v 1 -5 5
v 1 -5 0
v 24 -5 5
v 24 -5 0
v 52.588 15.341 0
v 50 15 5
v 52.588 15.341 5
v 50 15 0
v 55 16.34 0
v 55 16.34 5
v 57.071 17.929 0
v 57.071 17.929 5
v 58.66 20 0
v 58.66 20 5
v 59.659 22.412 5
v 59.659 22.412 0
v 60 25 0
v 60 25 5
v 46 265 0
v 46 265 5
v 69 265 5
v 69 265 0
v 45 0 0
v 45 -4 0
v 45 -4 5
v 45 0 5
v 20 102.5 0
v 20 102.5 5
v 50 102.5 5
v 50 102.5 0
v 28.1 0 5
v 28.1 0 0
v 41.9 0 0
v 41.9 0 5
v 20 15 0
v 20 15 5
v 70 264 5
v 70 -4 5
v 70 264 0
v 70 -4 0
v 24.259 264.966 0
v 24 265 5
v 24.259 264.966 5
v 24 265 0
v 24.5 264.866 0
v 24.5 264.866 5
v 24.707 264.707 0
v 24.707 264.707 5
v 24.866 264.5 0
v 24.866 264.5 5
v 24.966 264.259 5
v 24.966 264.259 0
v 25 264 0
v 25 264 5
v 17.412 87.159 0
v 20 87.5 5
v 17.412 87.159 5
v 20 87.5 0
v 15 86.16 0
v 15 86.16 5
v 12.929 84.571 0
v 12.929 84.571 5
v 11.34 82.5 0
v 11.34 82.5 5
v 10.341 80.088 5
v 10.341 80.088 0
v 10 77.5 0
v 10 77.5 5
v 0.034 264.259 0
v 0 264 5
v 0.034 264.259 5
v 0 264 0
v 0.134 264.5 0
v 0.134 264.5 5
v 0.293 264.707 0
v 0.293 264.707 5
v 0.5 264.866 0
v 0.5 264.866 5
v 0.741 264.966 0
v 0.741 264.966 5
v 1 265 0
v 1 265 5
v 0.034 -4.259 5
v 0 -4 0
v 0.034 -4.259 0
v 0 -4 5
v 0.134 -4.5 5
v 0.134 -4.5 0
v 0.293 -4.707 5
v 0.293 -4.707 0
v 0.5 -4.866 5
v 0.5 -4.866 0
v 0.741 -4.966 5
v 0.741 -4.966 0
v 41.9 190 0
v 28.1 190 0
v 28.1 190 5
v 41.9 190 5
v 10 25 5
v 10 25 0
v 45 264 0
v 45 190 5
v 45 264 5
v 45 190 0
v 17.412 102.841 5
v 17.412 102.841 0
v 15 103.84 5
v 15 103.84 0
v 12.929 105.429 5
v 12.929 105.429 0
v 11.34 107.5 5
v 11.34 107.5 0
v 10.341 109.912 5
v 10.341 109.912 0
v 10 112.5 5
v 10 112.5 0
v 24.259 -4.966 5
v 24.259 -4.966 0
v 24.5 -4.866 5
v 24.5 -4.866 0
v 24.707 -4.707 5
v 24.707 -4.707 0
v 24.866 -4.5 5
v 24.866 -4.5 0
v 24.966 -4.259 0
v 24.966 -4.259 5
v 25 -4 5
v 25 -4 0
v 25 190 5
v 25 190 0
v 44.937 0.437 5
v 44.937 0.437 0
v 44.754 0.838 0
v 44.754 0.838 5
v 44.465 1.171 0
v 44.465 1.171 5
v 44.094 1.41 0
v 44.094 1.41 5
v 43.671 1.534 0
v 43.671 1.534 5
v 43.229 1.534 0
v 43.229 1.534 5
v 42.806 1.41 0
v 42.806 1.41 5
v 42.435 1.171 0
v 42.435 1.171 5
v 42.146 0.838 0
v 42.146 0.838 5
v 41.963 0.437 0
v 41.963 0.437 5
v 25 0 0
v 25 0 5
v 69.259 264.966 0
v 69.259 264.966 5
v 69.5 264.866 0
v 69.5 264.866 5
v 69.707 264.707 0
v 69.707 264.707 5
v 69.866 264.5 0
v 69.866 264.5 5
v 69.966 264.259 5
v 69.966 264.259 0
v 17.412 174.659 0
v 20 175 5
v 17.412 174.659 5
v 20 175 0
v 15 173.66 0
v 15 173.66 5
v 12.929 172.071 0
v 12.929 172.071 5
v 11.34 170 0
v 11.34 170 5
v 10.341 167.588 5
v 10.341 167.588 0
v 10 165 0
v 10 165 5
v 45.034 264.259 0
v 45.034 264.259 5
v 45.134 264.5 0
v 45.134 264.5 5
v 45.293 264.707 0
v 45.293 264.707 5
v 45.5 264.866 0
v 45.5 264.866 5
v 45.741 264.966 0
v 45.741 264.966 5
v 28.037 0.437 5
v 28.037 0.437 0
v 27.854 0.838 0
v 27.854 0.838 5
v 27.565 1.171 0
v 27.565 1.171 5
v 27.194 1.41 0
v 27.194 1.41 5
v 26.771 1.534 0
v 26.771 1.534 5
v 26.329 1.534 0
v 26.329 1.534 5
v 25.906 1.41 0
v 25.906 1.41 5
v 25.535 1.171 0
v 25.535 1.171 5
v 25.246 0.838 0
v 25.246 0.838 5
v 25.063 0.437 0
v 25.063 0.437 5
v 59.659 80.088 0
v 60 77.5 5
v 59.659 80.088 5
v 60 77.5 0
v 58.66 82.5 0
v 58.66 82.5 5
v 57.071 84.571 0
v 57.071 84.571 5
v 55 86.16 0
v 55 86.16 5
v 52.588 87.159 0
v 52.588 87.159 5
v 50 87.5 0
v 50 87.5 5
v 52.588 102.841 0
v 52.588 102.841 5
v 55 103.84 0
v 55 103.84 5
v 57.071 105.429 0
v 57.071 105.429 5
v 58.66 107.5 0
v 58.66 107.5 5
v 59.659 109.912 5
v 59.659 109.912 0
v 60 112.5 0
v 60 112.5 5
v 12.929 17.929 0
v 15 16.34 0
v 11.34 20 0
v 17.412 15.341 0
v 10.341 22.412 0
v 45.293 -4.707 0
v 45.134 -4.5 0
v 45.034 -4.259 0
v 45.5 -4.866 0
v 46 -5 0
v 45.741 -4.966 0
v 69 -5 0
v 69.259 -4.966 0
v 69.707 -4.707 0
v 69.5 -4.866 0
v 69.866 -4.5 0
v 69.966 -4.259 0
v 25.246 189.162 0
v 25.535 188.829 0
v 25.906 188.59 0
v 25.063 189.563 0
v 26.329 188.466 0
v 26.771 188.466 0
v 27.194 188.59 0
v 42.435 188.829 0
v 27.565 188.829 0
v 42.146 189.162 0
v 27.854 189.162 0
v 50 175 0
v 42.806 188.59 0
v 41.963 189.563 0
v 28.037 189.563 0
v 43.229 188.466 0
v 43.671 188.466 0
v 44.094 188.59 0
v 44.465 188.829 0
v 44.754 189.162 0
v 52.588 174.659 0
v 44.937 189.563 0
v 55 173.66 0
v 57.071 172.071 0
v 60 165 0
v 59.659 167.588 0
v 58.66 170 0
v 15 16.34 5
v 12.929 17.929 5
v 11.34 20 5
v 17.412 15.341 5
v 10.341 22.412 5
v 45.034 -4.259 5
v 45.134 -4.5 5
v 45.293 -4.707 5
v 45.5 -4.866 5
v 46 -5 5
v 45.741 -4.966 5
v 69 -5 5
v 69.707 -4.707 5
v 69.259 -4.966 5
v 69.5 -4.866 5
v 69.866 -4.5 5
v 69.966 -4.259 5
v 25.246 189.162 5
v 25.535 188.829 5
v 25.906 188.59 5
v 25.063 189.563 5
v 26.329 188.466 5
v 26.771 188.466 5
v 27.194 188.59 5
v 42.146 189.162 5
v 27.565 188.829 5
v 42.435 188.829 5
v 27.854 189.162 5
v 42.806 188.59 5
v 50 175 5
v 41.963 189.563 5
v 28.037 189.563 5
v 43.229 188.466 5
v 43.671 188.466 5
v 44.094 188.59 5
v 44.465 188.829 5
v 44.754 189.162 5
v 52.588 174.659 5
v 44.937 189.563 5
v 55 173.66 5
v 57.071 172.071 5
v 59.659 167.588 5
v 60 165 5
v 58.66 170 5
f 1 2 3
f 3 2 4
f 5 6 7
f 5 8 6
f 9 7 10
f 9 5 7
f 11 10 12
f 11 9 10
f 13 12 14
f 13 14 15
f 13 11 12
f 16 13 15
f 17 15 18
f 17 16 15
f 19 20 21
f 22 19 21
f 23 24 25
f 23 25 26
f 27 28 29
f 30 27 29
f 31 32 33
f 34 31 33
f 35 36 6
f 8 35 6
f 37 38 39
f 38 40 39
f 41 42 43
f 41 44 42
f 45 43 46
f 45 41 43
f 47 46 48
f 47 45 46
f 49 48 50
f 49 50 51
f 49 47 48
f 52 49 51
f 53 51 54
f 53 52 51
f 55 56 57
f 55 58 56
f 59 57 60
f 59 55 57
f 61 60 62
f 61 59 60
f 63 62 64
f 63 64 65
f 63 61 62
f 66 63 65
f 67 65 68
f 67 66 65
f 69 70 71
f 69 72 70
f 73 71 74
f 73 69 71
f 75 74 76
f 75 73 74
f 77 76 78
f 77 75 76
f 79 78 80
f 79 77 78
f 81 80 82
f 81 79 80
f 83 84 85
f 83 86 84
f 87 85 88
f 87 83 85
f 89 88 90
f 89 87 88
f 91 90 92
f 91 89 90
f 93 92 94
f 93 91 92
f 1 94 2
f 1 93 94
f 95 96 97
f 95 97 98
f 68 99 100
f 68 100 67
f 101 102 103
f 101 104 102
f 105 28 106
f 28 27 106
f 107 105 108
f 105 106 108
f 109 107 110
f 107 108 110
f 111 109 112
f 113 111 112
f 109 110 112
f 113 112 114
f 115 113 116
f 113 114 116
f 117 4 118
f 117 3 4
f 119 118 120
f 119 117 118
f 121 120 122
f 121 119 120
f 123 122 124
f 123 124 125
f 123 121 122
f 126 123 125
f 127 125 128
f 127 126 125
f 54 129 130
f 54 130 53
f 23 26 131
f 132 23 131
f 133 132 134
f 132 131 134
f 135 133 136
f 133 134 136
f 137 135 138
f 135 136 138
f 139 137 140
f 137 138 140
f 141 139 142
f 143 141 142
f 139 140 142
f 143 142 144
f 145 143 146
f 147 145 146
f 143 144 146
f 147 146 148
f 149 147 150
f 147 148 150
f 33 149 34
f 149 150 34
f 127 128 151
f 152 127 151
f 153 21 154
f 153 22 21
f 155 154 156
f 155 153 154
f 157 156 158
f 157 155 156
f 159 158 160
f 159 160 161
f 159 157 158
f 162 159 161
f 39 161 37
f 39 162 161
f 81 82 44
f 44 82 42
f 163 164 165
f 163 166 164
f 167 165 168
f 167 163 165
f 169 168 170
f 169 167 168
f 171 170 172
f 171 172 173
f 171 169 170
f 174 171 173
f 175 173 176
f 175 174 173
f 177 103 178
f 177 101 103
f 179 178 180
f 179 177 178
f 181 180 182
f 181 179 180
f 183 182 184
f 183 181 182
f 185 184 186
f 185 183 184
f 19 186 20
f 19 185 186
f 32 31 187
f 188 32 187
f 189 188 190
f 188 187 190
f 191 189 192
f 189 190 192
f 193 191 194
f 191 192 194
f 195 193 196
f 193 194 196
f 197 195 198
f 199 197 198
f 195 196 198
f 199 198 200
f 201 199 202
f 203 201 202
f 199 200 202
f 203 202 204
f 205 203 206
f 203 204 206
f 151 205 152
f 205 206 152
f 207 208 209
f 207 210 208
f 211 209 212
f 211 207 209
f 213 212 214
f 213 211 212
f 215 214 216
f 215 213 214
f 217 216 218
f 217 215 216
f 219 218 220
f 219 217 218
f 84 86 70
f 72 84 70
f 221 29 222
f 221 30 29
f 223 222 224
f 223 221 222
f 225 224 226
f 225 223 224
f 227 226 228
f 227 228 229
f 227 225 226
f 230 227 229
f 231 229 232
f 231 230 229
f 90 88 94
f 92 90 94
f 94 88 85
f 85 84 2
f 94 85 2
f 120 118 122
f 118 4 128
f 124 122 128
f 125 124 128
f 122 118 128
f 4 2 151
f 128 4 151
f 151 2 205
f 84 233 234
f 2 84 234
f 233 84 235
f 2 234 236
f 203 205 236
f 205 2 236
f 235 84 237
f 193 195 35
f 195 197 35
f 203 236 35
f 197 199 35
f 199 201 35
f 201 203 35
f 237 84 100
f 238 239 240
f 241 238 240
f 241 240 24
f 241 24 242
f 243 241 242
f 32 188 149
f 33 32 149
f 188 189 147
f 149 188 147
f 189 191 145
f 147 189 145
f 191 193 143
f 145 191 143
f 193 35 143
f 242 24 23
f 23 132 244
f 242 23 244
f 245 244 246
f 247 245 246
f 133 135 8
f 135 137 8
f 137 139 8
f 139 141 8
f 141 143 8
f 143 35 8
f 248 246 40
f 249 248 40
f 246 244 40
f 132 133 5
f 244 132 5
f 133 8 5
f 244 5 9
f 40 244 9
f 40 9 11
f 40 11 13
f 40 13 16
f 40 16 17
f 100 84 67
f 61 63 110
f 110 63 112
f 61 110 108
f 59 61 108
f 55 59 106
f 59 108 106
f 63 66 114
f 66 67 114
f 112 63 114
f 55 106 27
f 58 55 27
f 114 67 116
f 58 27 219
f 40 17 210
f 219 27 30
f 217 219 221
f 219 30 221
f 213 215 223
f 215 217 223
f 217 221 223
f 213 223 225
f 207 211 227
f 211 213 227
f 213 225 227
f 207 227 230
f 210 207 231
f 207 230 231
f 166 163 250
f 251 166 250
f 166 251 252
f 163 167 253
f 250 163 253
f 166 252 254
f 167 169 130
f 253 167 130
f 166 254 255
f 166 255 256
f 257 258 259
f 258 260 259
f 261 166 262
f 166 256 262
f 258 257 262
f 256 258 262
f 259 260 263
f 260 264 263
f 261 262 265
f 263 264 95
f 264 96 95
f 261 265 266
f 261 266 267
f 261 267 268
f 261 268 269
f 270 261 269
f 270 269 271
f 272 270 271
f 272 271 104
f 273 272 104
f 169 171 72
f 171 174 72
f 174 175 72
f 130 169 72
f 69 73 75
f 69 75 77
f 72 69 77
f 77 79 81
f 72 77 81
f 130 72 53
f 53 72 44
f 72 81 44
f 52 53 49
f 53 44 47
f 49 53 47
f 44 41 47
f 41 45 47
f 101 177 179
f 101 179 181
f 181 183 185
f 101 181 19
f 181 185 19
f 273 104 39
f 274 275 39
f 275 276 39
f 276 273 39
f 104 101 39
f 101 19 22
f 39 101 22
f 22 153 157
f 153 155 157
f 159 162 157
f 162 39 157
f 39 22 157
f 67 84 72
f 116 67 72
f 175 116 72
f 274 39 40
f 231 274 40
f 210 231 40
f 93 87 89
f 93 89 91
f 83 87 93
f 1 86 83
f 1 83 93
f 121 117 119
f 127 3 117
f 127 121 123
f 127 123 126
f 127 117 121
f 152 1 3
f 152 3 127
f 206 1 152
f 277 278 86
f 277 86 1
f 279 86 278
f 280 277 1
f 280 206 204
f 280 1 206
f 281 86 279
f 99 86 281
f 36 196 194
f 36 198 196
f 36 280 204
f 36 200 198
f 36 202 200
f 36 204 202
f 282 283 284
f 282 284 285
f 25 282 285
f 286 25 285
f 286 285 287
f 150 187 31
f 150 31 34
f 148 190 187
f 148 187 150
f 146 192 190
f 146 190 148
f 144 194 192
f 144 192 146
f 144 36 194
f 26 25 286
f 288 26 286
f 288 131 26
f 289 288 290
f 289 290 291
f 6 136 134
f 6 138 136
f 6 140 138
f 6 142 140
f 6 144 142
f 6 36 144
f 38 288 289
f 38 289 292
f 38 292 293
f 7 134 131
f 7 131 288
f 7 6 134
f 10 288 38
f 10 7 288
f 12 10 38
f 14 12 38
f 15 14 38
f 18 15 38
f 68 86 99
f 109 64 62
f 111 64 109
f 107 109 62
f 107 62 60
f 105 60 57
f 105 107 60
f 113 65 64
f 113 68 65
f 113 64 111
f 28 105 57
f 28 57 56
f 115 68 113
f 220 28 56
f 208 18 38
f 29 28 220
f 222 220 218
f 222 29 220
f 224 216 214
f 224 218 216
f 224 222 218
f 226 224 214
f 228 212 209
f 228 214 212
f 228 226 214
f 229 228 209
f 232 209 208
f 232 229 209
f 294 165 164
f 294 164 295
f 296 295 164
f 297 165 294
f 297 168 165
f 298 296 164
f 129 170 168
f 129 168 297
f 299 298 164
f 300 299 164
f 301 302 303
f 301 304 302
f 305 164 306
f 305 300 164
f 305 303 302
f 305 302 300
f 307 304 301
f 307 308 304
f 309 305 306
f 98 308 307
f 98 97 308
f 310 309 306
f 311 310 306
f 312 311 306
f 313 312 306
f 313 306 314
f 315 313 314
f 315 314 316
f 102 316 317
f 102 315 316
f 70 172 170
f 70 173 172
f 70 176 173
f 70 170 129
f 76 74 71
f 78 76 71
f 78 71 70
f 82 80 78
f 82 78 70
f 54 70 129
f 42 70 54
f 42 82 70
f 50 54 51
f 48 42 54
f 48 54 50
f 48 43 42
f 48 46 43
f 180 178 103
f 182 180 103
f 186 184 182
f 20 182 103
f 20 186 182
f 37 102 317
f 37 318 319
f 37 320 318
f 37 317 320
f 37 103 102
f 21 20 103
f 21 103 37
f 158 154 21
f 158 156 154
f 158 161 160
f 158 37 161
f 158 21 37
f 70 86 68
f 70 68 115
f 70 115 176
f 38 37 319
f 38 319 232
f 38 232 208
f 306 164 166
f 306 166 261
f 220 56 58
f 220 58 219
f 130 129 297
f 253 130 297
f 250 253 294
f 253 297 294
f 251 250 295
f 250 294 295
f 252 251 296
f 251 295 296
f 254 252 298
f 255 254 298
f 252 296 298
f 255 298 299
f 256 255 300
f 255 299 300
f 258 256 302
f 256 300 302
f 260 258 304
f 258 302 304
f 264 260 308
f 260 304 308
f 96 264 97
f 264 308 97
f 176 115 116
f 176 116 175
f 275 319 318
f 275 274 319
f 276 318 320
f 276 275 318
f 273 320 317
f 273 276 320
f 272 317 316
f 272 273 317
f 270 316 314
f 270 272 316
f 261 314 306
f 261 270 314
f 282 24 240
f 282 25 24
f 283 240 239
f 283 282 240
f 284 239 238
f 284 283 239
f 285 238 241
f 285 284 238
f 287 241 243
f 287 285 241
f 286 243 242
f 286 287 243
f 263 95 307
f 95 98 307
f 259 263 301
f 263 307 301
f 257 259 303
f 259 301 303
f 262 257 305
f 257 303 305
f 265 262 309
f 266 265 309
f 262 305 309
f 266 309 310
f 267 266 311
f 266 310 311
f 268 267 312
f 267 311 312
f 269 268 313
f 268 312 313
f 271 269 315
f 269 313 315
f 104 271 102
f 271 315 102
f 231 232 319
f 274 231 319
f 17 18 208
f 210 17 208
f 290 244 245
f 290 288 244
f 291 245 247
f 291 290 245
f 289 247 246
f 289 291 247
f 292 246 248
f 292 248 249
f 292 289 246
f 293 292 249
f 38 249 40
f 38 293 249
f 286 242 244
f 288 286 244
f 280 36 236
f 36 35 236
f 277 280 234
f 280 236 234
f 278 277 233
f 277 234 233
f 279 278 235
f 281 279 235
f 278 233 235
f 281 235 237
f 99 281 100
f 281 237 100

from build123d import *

# Parameters (mm, degrees)
SKETCH_1_W          = 25
SKETCH_1_H          = 5
SKETCH_1_W_2        = 70
SKETCH_1_H_2        = 190
EXTRUDE_1_DEPTH     = 5
SKETCH_2_R          = 1.55
CUT_EXTRUDE_1_DEPTH = 5
SKETCH_3_W          = 25
SKETCH_3_H          = 70
EXTRUDE_2_DEPTH     = 5
SKETCH_4_W          = 50
SKETCH_4_H          = 72.5
CUT_EXTRUDE_2_DEPTH = 5
FILLET_1_R          = 10
FILLET_2_R          = 1


with BuildPart() as part:
    # 草图1 → 凸台-拉伸1 (new body)
    with BuildSketch(Plane.XY):
        with Locations((57.5, 192.5)):
            Rectangle(SKETCH_1_W, SKETCH_1_H)
        with Locations((35, 95)):
            Rectangle(SKETCH_1_W_2, SKETCH_1_H_2)
        with Locations((12.5, 192.5)):
            Rectangle(SKETCH_1_W, SKETCH_1_H)
        with Locations((57.5, -2.5)):
            Rectangle(SKETCH_1_W, SKETCH_1_H)
        with Locations((12.5, -2.5)):
            Rectangle(SKETCH_1_W, SKETCH_1_H)
    extrude(amount=EXTRUDE_1_DEPTH)

    # 草图2 → 切除-拉伸1 (cut)
    with BuildSketch(Plane.XY.offset(5)):
        with Locations((43.45, 0)):
            Circle(SKETCH_2_R)
        with Locations((26.55, 0)):
            Circle(SKETCH_2_R)
        with Locations((43.45, 190)):
            Circle(SKETCH_2_R)
        with Locations((26.55, 190)):
            Circle(SKETCH_2_R)
    extrude(amount=-CUT_EXTRUDE_1_DEPTH, mode=Mode.SUBTRACT)

    # 草图3 → 凸台-拉伸2 (add)
    with BuildSketch(Plane.XY.offset(5)):
        with Locations((12.5, 230)):
            Rectangle(SKETCH_3_W, SKETCH_3_H)
        with Locations((57.5, 230)):
            Rectangle(SKETCH_3_W, SKETCH_3_H)
    extrude(amount=-EXTRUDE_2_DEPTH)

    # 草图4 → 切除-拉伸2 (cut)
    with BuildSketch(Plane.XY.offset(5)):
        with Locations((35, 138.75)):
            Rectangle(SKETCH_4_W, SKETCH_4_H)
        with Locations((35, 51.25)):
            Rectangle(SKETCH_4_W, SKETCH_4_H)
    extrude(amount=-CUT_EXTRUDE_2_DEPTH, mode=Mode.SUBTRACT)

    # 圆角1
    fillet_1_edges = [part.edges().sort_by_distance(p)[0] for p in [
        (10, 15, 2.5),
        (10, 87.5, 2.5),
        (60, 87.5, 2.5),
        (60, 15, 2.5),
        (60, 102.5, 2.5),
        (10, 102.5, 2.5),
        (10, 175, 2.5),
        (60, 175, 2.5),
    ]]
    fillet(fillet_1_edges, radius=FILLET_1_R)

    # 圆角2
    fillet_2_edges = [part.edges().sort_by_distance(p)[0] for p in [
        (70, -5, 2.5),
        (45, -5, 2.5),
        (25, -5, 2.5),
        (0, -5, 2.5),
        (25, 265, 2.5),
        (0, 265, 2.5),
        (70, 265, 2.5),
        (45, 265, 2.5),
    ]]
    fillet(fillet_2_edges, radius=FILLET_2_R)


solid = part.part
